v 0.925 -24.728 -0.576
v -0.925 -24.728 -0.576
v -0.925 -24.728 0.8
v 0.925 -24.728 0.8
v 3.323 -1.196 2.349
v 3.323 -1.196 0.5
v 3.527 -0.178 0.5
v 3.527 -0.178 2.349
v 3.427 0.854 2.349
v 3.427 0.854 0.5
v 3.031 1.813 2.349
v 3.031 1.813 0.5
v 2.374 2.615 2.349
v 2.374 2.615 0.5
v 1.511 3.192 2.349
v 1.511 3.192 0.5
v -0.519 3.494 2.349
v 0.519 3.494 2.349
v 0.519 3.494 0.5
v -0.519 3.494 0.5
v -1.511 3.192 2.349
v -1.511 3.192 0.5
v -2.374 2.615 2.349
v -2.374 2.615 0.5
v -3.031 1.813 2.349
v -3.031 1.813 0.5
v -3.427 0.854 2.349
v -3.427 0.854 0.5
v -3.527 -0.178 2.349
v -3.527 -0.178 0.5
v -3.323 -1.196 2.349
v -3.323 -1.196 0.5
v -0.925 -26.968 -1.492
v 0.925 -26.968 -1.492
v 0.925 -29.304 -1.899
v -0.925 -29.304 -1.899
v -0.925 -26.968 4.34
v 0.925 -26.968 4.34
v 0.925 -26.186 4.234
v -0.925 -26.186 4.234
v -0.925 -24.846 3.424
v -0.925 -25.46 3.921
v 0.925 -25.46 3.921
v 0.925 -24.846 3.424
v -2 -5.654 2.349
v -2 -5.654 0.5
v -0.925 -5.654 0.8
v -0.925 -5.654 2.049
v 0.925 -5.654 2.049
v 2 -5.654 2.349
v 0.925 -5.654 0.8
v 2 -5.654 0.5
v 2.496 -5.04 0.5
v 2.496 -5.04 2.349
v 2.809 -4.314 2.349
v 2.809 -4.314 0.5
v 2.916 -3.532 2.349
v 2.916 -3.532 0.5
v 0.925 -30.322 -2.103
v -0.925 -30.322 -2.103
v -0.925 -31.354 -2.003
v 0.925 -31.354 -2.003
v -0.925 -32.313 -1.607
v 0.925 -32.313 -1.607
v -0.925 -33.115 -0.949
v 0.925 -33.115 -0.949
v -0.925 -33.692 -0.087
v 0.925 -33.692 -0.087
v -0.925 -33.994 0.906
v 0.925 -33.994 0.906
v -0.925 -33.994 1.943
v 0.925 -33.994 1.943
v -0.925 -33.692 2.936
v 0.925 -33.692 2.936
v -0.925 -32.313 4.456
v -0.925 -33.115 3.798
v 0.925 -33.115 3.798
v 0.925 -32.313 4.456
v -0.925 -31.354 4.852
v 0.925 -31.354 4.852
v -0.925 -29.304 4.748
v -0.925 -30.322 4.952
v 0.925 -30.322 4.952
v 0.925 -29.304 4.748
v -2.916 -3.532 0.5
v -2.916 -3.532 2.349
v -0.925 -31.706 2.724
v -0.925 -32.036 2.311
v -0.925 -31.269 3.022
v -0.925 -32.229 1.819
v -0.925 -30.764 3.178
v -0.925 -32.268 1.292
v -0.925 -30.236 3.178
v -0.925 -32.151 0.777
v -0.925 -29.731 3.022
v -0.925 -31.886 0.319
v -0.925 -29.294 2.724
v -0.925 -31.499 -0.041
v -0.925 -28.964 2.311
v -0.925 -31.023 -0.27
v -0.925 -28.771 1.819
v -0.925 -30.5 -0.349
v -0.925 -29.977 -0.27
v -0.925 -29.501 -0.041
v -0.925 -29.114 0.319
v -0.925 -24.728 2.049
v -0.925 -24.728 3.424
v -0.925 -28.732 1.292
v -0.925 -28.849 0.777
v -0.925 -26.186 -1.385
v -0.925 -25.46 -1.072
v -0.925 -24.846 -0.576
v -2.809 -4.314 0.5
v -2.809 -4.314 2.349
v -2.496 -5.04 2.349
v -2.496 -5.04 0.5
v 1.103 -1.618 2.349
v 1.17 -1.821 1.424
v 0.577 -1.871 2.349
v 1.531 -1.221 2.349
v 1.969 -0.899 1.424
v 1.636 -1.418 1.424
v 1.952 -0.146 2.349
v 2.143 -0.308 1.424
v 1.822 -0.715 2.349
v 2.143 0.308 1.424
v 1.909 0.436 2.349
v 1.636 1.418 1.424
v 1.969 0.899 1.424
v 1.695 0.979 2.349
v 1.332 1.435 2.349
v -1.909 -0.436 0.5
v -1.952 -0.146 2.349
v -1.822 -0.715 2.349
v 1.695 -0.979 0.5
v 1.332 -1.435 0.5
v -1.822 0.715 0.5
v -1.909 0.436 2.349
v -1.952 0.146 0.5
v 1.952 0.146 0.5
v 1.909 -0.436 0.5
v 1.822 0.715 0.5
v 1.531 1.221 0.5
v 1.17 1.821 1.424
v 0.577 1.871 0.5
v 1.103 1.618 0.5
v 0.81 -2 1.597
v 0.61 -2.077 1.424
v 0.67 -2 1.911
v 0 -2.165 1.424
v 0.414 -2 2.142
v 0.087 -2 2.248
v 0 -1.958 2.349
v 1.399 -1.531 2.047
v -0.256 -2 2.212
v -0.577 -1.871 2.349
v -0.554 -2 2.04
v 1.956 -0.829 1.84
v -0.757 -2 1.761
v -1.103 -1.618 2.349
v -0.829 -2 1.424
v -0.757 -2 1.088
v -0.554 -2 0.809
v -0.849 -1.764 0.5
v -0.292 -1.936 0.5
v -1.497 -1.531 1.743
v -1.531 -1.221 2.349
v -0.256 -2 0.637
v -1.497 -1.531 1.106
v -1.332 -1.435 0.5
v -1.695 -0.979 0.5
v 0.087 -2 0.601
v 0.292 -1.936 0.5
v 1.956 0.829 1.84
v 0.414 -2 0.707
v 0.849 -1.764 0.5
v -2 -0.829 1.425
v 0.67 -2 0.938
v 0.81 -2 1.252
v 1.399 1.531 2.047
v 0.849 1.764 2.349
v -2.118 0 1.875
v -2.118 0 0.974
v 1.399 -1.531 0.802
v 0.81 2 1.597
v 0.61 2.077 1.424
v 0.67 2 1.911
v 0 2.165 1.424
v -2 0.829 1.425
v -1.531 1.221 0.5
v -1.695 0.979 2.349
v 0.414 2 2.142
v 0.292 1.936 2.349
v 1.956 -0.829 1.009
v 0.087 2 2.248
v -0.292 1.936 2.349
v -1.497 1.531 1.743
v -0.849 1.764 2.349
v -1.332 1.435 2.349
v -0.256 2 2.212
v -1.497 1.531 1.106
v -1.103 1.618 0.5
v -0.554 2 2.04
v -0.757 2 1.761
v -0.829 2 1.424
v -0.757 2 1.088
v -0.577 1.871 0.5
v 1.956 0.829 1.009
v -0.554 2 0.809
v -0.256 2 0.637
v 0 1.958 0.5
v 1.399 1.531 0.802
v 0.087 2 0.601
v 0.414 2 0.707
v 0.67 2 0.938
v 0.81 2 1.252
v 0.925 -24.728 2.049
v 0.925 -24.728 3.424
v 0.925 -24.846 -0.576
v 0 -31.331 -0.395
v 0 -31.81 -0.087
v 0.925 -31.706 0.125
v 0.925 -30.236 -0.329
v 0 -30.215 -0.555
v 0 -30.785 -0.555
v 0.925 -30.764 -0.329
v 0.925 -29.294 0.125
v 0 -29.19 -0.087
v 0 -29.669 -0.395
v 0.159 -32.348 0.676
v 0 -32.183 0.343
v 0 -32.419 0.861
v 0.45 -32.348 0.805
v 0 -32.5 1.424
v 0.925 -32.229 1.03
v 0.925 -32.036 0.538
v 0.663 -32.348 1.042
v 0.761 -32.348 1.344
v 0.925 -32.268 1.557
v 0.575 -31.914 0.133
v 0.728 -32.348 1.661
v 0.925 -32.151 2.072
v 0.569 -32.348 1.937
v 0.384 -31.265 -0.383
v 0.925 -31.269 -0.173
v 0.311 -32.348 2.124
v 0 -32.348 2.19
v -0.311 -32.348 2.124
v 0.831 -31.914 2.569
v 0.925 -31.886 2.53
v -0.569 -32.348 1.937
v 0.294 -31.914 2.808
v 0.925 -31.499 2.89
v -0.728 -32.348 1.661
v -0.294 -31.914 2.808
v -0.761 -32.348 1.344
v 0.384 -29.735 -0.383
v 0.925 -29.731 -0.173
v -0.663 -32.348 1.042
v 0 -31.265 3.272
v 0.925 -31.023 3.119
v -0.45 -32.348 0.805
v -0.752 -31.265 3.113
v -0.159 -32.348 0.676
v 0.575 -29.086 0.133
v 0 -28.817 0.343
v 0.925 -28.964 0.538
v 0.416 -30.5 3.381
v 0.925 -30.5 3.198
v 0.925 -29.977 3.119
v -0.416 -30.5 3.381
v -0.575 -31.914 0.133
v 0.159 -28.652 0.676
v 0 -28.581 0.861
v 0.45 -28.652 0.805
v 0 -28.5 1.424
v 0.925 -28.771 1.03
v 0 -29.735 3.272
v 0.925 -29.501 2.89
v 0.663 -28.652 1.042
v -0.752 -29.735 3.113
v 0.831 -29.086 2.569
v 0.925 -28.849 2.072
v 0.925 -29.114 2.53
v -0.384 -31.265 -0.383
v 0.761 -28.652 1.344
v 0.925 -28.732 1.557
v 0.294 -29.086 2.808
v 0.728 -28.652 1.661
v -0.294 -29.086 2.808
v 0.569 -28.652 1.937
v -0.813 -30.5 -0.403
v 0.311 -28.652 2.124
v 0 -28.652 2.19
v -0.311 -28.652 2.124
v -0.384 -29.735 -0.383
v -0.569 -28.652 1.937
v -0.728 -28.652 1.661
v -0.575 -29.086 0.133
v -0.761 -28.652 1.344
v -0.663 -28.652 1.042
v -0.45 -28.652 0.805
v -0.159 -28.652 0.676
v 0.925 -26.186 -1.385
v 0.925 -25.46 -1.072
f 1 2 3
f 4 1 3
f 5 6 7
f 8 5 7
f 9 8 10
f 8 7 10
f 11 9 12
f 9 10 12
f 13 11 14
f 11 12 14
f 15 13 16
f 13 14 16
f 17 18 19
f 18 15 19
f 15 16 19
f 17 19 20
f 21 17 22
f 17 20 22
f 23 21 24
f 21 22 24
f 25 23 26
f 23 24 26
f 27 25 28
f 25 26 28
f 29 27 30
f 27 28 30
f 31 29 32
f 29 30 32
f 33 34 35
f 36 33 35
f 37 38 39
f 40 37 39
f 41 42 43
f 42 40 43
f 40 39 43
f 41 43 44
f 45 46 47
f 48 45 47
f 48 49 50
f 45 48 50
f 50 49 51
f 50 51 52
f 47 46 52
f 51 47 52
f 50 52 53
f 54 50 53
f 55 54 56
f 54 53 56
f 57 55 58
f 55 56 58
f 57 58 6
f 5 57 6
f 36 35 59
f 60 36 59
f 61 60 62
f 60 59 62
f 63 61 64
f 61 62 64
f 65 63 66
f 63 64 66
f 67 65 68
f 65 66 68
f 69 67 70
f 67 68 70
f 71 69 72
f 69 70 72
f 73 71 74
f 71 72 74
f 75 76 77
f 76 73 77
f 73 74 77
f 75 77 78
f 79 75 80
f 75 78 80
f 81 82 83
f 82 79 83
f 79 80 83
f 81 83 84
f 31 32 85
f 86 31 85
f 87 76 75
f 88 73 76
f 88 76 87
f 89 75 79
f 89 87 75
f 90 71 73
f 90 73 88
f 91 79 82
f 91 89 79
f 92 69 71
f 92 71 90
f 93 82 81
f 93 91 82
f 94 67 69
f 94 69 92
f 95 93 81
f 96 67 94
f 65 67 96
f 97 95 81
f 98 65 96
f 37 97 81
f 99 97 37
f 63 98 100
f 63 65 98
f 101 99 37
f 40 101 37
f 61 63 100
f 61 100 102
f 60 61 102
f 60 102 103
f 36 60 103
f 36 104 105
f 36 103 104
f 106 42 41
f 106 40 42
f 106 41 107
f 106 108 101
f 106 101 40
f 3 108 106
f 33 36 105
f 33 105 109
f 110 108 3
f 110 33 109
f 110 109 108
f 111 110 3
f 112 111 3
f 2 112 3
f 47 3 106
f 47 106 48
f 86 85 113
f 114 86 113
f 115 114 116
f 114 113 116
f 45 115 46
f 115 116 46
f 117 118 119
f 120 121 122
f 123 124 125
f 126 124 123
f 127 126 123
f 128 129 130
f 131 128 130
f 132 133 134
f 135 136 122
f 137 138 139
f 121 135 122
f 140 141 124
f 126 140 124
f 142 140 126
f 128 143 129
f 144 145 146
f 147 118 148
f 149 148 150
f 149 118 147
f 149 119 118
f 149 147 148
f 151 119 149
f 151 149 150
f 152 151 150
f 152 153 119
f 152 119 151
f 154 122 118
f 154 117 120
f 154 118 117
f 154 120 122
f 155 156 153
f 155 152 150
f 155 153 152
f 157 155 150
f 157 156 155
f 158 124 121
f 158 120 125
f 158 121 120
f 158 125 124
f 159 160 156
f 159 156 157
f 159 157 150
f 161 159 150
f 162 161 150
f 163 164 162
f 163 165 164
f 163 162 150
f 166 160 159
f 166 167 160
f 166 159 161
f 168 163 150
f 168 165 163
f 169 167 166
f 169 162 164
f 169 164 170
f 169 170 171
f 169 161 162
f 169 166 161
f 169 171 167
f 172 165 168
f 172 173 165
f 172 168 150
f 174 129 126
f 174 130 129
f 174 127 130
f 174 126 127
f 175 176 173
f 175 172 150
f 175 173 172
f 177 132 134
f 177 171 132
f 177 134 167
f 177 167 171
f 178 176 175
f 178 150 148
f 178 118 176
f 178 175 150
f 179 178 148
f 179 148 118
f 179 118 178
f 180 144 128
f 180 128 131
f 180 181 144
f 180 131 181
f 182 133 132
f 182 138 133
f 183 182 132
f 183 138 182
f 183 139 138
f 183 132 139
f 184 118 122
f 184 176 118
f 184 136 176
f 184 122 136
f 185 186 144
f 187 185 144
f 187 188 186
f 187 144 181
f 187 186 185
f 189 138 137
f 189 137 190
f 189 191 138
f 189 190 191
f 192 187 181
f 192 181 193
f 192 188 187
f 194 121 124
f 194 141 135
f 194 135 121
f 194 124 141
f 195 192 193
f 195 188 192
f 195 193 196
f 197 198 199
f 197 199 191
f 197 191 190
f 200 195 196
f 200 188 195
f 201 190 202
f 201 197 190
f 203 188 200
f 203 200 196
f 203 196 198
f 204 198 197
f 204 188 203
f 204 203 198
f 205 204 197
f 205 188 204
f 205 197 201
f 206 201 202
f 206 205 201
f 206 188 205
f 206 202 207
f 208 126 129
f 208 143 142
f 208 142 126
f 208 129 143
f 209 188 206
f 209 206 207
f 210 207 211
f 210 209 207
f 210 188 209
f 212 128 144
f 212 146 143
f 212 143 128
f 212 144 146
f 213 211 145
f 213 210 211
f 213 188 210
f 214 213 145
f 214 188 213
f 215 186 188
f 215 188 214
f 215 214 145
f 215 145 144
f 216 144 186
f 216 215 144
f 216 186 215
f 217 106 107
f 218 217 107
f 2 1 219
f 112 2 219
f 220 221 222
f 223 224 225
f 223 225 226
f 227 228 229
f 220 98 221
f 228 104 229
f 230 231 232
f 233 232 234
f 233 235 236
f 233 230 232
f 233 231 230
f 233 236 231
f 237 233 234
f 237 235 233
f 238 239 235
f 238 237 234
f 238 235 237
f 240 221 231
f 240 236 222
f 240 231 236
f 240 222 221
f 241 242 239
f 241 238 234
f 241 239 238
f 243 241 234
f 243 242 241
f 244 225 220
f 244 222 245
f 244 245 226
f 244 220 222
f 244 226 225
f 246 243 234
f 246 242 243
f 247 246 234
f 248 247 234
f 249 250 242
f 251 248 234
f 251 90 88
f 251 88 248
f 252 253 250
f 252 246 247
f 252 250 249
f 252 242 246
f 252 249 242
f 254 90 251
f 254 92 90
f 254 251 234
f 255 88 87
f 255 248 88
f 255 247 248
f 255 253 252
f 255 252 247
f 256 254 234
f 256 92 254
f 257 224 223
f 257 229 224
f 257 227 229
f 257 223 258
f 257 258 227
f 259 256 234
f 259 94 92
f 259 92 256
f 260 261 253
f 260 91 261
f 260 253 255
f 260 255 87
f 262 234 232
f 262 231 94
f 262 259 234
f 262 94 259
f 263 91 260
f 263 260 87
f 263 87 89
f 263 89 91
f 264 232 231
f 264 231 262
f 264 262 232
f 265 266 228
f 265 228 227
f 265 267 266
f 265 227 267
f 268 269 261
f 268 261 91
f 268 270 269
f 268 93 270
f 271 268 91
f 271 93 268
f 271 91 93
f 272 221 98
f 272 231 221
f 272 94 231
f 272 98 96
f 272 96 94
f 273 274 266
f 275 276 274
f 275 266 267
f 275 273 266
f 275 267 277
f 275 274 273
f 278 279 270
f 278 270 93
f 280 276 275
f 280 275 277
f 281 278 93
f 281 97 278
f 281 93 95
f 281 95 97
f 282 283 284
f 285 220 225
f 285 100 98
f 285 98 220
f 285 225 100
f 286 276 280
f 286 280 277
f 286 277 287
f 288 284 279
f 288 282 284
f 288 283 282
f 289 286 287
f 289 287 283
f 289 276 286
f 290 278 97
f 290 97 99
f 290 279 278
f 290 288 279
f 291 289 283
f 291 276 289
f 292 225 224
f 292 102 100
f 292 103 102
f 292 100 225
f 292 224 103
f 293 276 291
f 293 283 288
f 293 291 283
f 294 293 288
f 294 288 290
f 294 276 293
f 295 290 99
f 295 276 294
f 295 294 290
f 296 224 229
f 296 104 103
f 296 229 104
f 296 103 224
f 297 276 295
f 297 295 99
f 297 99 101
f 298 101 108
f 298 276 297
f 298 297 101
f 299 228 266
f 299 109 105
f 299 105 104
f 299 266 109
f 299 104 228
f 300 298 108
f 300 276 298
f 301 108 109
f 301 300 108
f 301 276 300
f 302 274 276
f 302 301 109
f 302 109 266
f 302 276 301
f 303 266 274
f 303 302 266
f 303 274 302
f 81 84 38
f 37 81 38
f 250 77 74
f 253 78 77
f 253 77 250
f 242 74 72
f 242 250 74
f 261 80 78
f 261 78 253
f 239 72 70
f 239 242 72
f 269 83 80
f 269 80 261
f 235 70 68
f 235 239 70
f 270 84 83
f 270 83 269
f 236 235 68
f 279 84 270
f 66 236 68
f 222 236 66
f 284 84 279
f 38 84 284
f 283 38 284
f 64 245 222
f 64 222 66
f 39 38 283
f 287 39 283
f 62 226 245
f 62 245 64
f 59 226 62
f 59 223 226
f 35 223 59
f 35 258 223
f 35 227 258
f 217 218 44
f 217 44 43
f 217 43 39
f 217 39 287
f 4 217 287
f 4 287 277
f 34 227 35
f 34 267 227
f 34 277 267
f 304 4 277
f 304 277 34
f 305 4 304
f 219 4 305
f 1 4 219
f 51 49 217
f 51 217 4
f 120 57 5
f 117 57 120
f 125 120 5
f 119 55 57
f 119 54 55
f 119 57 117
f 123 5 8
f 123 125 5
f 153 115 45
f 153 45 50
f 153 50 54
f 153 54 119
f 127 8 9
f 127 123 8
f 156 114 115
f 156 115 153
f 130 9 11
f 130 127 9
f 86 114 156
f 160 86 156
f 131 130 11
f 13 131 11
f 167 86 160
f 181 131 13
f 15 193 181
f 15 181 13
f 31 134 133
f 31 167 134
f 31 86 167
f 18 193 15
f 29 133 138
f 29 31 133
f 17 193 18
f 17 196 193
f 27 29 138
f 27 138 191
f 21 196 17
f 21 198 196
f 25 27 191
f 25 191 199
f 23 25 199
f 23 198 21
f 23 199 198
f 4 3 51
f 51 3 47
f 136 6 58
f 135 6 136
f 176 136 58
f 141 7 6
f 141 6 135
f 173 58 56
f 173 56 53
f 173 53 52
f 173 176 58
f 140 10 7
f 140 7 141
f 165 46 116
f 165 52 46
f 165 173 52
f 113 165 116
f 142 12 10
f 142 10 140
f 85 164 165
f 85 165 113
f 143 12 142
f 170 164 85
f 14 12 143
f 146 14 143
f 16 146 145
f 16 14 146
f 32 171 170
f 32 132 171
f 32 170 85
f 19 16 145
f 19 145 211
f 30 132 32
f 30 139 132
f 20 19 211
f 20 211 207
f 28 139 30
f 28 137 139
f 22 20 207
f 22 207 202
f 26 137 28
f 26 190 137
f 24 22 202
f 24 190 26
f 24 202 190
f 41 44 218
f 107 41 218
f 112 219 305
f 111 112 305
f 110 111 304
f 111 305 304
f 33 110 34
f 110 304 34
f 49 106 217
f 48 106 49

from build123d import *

# Parameters (mm, degrees)
SKETCH_1_R               = 3.532
SKETCH_1_R_2             = 2.165
EXTRUDE_1_DEPTH          = 2.849
EXTRUDE_START            = -2.849
EXTRUDE_3_DEPTH          = 2.849
EXTRUDE_4_DEPTH          = 2.849
SKETCH_5_W               = 4
SKETCH_5_H               = 8.802
EXTRUDE_5_DEPTH          = 2.849
EXTRUDE_6_DEPTH          = 2
EXTRUDE_6_DEPTH_BACK     = 2
SKETCH_11_R              = 2.165
SKETCH_12_W              = 1.376249561
SKETCH_12_H              = 19.360404774
SKETCH_12_W_2            = 1.095086679
CUT_EXTRUDE_1_DEPTH      = 24
CUT_EXTRUDE_2_DEPTH      = 24
CUT_EXTRUDE_2_DEPTH_BACK = 24
SKETCH_14_W              = 1.935032997
SKETCH_14_H              = 19.90949692
SKETCH_14_W_2            = 1.968594382
SKETCH_15_W              = 2.629097519
SKETCH_15_H              = 19.073490401
SKETCH_15_W_2            = 3.221303736
CUT_EXTRUDE_3_DEPTH      = 24
SKETCH_16_W              = 0.5
SKETCH_16_H              = 9.595959473
CUT_EXTRUDE_4_DEPTH      = 24
CUT_EXTRUDE_5_DEPTH      = 24
CUT_EXTRUDE_5_DEPTH_BACK = 24
SKETCH_17_W              = 1.075
SKETCH_17_H              = 30.344064149
SKETCH_19_R              = 2.165
EXTRUDE_7_DEPTH          = 1.849
SKETCH_21_R              = 2.165
EXTRUDE_9_DEPTH          = 1.85


with BuildPart() as part:
    # 草图1 → 凸台-拉伸1 (new body)
    with BuildSketch(Plane.XY):
        Circle(SKETCH_1_R)
        Circle(SKETCH_1_R_2, mode=Mode.SUBTRACT)
    extrude(amount=EXTRUDE_1_DEPTH)

    # 草图3 → 凸台-拉伸3 (add)
    with BuildSketch(Plane.XY.offset(2.849).offset(EXTRUDE_START)):
        with BuildLine():
            Line((-3.323475253, -1.195632151), (-2.916, -3.532))
            ThreePointArc((-2.916, -3.532), (0, -6.448), (2.916, -3.532))
            Line((2.916, -3.532), (3.323475253, -1.195632151))
            ThreePointArc((3.323475253, -1.195632151), (3.042882681, -1.79328999), (2.655959655, -2.328283126))
            ThreePointArc((2.655959655, -2.328283126), (-0.657357457, -3.470288918), (-3.323475253, -1.195632151))
        make_face()
    extrude(amount=EXTRUDE_3_DEPTH)

    # 草图4 → 凸台-拉伸4 (add)
    with BuildSketch(Plane.XY.offset(2.849).offset(EXTRUDE_START)):
        with BuildLine():
            ThreePointArc((2, -5.654040527), (1.075914918, -6.242251481), (0, -6.448))
            Line((0, -6.448), (2, -6.448))
            Line((2, -6.448), (2, -5.654040527))
        make_face()
        with BuildLine():
            Line((0, -6.448), (-2, -6.448))
            Line((-2, -6.448), (-2, -5.654040527))
            ThreePointArc((-2, -5.654040527), (-1.075914918, -6.242251481), (0, -6.448))
        make_face()
    extrude(amount=EXTRUDE_4_DEPTH)

    # 草图5 → 凸台-拉伸5 (add)
    with BuildSketch(Plane.XY.offset(2.849)):
        with Locations((0, -10.849)):
            Rectangle(SKETCH_5_W, SKETCH_5_H)
    extrude(amount=-EXTRUDE_5_DEPTH)

    # 草图11 → 凸台-拉伸6 (add, two sides: drawn at the far end of the back side and taken through both)
    with BuildSketch(Plane.ZY.offset(-EXTRUDE_6_DEPTH_BACK)):
        with BuildLine():
            Line((4.747975253, -29.304367849), (4.3405, -26.968))
            ThreePointArc((4.3405, -26.968), (4.101723935, -25.812349534), (3.4245, -24.845959473))
            Line((3.4245, -24.845959473), (3.4245, -15.25))
            Line((3.4245, -15.25), (-0.5755, -15.25))
            Line((-0.5755, -15.25), (-0.5755, -24.845959473))
            ThreePointArc((-0.5755, -24.845959473), (-1.252723935, -25.812349534), (-1.4915, -26.968))
            Line((-1.4915, -26.968), (-1.898975253, -29.304367849))
            ThreePointArc((-1.898975253, -29.304367849), (1.4245, -34.032), (4.747975253, -29.304367849))
        make_face()
        with Locations((1.4245, -30.5)):
            Circle(SKETCH_11_R, mode=Mode.SUBTRACT)
    extrude(amount=EXTRUDE_6_DEPTH + EXTRUDE_6_DEPTH_BACK)

    # 草图12 → 切除-拉伸1 (cut)
    with BuildSketch(Plane.ZY.offset(12)):
        with Locations((-0.188124781, -5.556058724)):
            Rectangle(SKETCH_12_W, SKETCH_12_H)
        with Locations((2.896543339, -5.556058724)):
            Rectangle(SKETCH_12_W_2, SKETCH_12_H)
    extrude(amount=-CUT_EXTRUDE_1_DEPTH, mode=Mode.SUBTRACT)

    # 草图14 → 切除-拉伸2 (cut, two sides: drawn at the far end of the back side and taken through both)
    with BuildSketch(Plane.XY.offset(3.4245).offset(-CUT_EXTRUDE_2_DEPTH_BACK)):
        with Locations((-2.467516499, -25.20474846)):
            Rectangle(SKETCH_14_W, SKETCH_14_H)
        with Locations((2.484297191, -25.20474846)):
            Rectangle(SKETCH_14_W_2, SKETCH_14_H)
    extrude(amount=CUT_EXTRUDE_2_DEPTH + CUT_EXTRUDE_2_DEPTH_BACK, mode=Mode.SUBTRACT)

    # 草图15 → 切除-拉伸3 (cut)
    with BuildSketch(Plane.ZY.offset(12)):
        with Locations((-0.51454876, -15.190785727)):
            Rectangle(SKETCH_15_W, SKETCH_15_H)
        with Locations((3.659651868, -15.190785727)):
            Rectangle(SKETCH_15_W_2, SKETCH_15_H)
    extrude(amount=-CUT_EXTRUDE_3_DEPTH, mode=Mode.SUBTRACT)

    # 草图16 → 切除-拉伸4 (cut)
    with BuildSketch(Plane(origin=(0, 0, 0.8), x_dir=(-1, 0, 0), z_dir=(0, 0, -1))):
        with Locations((-1.75, -10.452020264)):
            Rectangle(SKETCH_16_W, SKETCH_16_H)
        with Locations((1.75, -10.452020264)):
            Rectangle(SKETCH_16_W, SKETCH_16_H)
    extrude(amount=-CUT_EXTRUDE_4_DEPTH, mode=Mode.SUBTRACT)

    # 草图17 → 切除-拉伸5 (cut, two sides: drawn at the far end of the back side and taken through both)
    with BuildSketch(Plane.XY.offset(2.049).offset(-CUT_EXTRUDE_5_DEPTH_BACK)):
        with Locations((-1.4625, -20.826072602)):
            Rectangle(SKETCH_17_W, SKETCH_17_H)
        with Locations((1.4625, -20.826072602)):
            Rectangle(SKETCH_17_W, SKETCH_17_H)
    extrude(amount=CUT_EXTRUDE_5_DEPTH + CUT_EXTRUDE_5_DEPTH_BACK, mode=Mode.SUBTRACT)

    # 草图19 → 凸台-拉伸7 (add)
    with BuildSketch(Plane(origin=(0, 0, 0.5), x_dir=(-1, 0, 0), z_dir=(0, 0, -1))):
        Circle(SKETCH_19_R)
    extrude(amount=-EXTRUDE_7_DEPTH)

    # 草图18 → 切除-旋转3 (revolve, cut)
    with BuildSketch(Plane(origin=(0, 0, 1.4245), x_dir=(-1, 0, 0), z_dir=(0, 0, -1))):
        with BuildLine():
            Line((0, 2.165), (0, -2.165))
            ThreePointArc((0, -2.165), (-2.165, 0), (0, 2.165))
        make_face()
    revolve(axis=Axis((0, 2.165, 1.4245), (0, -1, 0)), mode=Mode.SUBTRACT)

    # 草图21 → 凸台-拉伸9 (add)
    with BuildSketch(Plane(origin=(0.925, 0, 0), x_dir=(0, 0, -1), z_dir=(1, 0, 0))):
        with Locations((-1.4245, -30.5)):
            Circle(SKETCH_21_R)
    extrude(amount=-EXTRUDE_9_DEPTH)

    # 草图22 → 切除-旋转4 (revolve, cut)
    with BuildSketch(Plane.ZY):
        with BuildLine():
            Line((1.4245, -28.5), (1.4245, -32.5))
            ThreePointArc((1.4245, -32.5), (-0.5755, -30.5), (1.4245, -28.5))
        make_face()
    revolve(axis=Axis((0, -28.5, 1.4245), (0, -1, 0)), mode=Mode.SUBTRACT)


solid = part.part
